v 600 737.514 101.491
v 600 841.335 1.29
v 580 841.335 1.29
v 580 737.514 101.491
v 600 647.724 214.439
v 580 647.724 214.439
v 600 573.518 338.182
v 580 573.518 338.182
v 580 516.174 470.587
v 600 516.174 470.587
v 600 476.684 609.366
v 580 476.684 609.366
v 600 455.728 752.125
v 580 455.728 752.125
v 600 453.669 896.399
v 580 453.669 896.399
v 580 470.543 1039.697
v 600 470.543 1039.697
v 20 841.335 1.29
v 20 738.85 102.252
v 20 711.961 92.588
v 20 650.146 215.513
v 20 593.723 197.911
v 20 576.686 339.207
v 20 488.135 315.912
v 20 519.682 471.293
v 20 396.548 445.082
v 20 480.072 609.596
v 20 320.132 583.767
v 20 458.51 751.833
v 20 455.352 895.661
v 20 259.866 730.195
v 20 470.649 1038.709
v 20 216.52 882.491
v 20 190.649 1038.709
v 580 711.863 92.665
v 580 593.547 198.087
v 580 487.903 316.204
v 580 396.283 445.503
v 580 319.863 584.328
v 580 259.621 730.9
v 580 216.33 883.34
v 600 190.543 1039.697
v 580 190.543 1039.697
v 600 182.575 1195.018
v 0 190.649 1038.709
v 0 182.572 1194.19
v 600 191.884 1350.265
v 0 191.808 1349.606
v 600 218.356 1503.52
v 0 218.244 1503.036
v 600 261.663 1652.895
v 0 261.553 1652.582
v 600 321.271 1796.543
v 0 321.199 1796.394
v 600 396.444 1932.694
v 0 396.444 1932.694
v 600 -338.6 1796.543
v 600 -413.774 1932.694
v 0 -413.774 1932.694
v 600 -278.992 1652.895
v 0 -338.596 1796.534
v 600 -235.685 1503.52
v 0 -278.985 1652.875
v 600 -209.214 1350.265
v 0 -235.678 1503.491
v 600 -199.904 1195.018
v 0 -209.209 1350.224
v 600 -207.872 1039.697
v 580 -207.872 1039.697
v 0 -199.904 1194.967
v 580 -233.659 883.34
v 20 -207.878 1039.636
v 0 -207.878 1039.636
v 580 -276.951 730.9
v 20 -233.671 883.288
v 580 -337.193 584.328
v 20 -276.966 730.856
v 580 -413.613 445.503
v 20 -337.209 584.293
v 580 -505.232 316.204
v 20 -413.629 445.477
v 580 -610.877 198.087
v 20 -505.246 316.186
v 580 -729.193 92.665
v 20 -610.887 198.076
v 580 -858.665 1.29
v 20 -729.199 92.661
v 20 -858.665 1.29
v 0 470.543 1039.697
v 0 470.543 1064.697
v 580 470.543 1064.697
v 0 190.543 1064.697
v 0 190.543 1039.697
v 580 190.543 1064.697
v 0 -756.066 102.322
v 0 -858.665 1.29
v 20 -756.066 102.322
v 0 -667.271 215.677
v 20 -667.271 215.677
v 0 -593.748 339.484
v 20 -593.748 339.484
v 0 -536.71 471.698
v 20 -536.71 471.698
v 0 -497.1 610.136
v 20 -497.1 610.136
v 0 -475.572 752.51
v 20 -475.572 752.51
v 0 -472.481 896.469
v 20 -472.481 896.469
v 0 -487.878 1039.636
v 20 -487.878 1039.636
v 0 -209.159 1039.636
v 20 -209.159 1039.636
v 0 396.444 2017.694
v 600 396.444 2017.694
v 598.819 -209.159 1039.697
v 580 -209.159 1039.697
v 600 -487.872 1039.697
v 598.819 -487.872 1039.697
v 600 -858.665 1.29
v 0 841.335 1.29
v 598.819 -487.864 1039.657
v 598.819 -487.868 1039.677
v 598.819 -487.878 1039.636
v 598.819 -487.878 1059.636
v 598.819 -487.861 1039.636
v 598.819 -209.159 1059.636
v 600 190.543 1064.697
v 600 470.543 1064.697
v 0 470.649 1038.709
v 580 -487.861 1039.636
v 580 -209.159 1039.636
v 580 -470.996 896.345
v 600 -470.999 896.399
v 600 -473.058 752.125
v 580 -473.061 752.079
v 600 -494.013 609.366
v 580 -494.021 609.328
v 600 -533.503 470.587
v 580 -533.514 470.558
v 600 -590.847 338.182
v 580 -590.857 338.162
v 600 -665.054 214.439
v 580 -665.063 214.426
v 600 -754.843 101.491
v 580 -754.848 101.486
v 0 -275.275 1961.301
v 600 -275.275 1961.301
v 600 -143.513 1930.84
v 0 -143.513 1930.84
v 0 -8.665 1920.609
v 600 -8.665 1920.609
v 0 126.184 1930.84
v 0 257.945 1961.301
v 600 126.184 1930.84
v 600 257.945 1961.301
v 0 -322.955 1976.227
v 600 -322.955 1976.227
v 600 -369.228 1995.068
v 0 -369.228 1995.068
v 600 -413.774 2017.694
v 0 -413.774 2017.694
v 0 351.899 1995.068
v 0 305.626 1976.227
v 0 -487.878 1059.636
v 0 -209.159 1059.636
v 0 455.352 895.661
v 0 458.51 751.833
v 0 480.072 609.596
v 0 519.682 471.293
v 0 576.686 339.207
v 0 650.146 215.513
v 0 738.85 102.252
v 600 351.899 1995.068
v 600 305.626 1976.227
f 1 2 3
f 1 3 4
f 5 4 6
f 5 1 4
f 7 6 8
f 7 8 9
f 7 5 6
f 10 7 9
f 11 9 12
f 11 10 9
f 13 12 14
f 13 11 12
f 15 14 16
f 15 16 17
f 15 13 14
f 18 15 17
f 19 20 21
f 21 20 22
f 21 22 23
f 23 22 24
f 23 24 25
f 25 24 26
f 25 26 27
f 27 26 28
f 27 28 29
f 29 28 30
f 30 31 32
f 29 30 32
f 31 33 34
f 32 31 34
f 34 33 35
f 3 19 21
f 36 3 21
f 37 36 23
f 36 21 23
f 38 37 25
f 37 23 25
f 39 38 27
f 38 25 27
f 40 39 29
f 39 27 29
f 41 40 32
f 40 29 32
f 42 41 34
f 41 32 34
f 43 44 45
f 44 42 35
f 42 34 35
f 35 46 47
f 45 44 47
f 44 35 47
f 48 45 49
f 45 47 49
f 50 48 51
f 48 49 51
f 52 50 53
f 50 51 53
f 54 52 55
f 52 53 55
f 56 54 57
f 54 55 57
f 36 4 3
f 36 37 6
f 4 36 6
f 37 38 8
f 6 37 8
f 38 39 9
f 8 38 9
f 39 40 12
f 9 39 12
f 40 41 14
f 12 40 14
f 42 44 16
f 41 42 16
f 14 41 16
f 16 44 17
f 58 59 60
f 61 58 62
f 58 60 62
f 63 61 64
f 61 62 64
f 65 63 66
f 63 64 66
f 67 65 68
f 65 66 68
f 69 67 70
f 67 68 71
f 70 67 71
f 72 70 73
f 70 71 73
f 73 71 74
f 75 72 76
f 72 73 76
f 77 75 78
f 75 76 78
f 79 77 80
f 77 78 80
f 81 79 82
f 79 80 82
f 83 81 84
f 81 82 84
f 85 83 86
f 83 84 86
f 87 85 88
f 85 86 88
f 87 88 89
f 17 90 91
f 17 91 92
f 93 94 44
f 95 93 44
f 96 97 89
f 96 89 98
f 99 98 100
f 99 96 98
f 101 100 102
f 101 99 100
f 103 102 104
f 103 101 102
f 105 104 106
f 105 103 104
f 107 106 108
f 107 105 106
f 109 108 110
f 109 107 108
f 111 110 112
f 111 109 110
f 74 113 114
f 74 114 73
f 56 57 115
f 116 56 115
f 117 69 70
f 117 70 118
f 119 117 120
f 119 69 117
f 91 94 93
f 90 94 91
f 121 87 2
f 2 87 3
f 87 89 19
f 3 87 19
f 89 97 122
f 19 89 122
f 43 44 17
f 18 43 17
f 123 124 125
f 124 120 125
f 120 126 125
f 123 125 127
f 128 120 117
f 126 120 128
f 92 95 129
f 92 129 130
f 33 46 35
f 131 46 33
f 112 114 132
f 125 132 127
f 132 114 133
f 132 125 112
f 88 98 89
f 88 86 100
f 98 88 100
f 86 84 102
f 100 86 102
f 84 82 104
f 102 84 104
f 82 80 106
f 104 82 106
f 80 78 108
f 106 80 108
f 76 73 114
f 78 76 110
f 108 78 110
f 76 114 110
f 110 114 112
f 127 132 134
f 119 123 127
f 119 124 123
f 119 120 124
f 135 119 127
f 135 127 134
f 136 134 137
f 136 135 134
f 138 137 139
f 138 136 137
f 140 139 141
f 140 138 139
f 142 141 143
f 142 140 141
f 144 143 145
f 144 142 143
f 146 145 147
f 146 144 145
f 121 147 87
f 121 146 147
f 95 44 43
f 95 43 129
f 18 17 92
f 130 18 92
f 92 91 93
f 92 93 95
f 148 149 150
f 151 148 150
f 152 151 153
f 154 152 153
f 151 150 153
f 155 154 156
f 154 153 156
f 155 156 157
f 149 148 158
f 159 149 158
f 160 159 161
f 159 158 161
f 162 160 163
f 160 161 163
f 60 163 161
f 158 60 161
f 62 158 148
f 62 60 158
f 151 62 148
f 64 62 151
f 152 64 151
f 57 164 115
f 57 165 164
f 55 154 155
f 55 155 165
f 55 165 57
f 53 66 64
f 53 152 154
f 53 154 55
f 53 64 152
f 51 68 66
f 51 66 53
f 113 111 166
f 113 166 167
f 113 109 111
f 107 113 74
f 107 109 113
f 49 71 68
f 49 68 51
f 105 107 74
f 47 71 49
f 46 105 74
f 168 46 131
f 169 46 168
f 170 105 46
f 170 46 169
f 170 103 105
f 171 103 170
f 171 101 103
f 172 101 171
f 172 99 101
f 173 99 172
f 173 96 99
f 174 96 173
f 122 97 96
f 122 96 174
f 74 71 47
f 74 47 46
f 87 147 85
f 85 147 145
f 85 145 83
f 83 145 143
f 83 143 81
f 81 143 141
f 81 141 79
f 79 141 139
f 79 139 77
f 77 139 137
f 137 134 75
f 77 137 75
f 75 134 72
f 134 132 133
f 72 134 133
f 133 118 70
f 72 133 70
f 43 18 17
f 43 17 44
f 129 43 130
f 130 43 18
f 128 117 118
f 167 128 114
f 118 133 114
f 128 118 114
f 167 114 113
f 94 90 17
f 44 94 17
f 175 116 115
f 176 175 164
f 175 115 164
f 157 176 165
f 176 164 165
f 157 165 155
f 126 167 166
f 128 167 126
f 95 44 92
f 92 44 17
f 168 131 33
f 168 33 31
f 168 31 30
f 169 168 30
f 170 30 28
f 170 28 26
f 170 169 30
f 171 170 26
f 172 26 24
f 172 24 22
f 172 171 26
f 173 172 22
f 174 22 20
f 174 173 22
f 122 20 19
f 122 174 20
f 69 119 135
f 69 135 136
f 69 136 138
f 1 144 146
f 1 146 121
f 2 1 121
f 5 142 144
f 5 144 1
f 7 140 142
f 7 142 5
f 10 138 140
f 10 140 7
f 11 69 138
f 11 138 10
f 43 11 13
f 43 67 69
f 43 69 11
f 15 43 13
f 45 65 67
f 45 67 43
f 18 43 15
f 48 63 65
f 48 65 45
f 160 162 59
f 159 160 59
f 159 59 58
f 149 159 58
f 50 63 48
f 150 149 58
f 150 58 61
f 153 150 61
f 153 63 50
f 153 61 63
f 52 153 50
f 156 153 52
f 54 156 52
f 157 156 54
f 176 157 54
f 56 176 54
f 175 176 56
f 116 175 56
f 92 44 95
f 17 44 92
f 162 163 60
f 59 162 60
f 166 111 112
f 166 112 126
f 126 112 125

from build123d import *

# Parameters (mm, degrees)
F1_DEPTH  = 600
F3_DEPTH  = 600.001
F5_DEPTH  = 20
F7_DEPTH  = 20
F8_W      = 580
F8_H      = 280
F9_DEPTH  = 25
F10_DEPTH = 20
F11_W     = 20
F11_H     = 278.7190201738
F11_W_2   = 578.8190174103
F12_DEPTH = 20


with BuildPart() as f1:
    # F0 (on Right) → F1 (new body)
    with BuildSketch(Plane.YZ):
        with BuildLine():
            ThreePointArc((-413.7737442203, 1932.6941884178), (-235.6171133469, 874.7152717166), (-858.6646769196, 1.2904570733))
            Line((-858.6646769196, 1.2904570733), (841.3353230804, 1.2904570733))
            ThreePointArc((841.3353230804, 1.2904570733), (218.2877610308, 874.7152723164), (396.4443930804, 1932.6941884178))
            Line((396.4443930804, 1932.6941884178), (396.4443930804, 2017.6941884178))
            ThreePointArc((396.4443930804, 2017.6941884178), (199.7456261802, 1948.7680536266), (-8.6646769196, 1951.2904570733))
            ThreePointArc((-8.6646769196, 1951.2904570733), (-217.0749786293, 1948.7680541113), (-413.7737442203, 2017.6941884178))
            Line((-413.7737442203, 2017.6941884178), (-413.7737442203, 1932.6941884178))
        make_face()
    extrude(amount=F1_DEPTH)

    # F2 (on face) → F3 (cut, through all)
    with BuildSketch(Plane.YZ.offset(600)):
        with BuildLine():
            Line((396.4443930804, 2017.6941884178), (-413.7737442203, 2017.6941884178))
            ThreePointArc((-413.7737442203, 2017.6941884178), (-345.7057427079, 1986.5957603046), (-275.2746839195, 1961.3008790249))
            ThreePointArc((-275.2746839195, 1961.3008790249), (-142.5331399832, 1941.2889121961), (-8.6646769196, 1951.2904570733))
            ThreePointArc((-8.6646769196, 1951.2904570733), (125.2037851776, 1941.2889117025), (257.9453283126, 1961.3008776288))
            ThreePointArc((257.9453283126, 1961.3008776288), (328.3763894007, 1986.5957594221), (396.4443930804, 2017.6941884178))
        make_face()
        with BuildLine():
            ThreePointArc((-8.6646769196, 1951.2904570733), (-142.5331399832, 1941.2889121961), (-275.2746839195, 1961.3008790249))
            ThreePointArc((-275.2746839195, 1961.3008790249), (-8.66467791, 1920.6086514411), (257.9453283126, 1961.3008776288))
            ThreePointArc((257.9453283126, 1961.3008776288), (125.2037851776, 1941.2889117025), (-8.6646769196, 1951.2904570733))
        make_face()
    extrude(amount=-F3_DEPTH, mode=Mode.SUBTRACT)

    # F4 (on face) → F5 (join)
    with BuildSketch(Plane.YZ.offset(600)):
        with BuildLine():
            ThreePointArc((-487.8719790556, 1039.6971702576), (-533.5033840935, 470.5867589871), (-858.6646769196, 1.2904570733))
            ThreePointArc((-858.6646769196, 1.2904570733), (-413.6127871917, 445.5030116798), (-207.8719790556, 1039.6971702576))
            Line((-207.8719790556, 1039.6971702576), (-487.8719790556, 1039.6971702576))
        make_face()
        with BuildLine():
            ThreePointArc((190.5426270267, 1039.6971702576), (396.283434362, 445.5030119538), (841.3353230804, 1.2904570733))
            ThreePointArc((841.3353230804, 1.2904570733), (516.1740306428, 470.5867590462), (470.5426270267, 1039.6971702576))
            Line((470.5426270267, 1039.6971702576), (190.5426270267, 1039.6971702576))
        make_face()
    extrude(amount=-F5_DEPTH)

    # F6 (on face) → F7 (join)
    with BuildSketch(Plane(origin=(0, 0, 0), x_dir=(0, -1, 0), z_dir=(-1, 0, 0))):
        with BuildLine():
            ThreePointArc((-841.3353230804, 1.2904570733), (-396.5475396439, 445.0817710452), (-190.6490020093, 1038.7085012816))
            Line((-190.6490020093, 1038.7085012816), (-470.6490020093, 1038.7085012816))
            ThreePointArc((-470.6490020093, 1038.7085012816), (-519.6815928842, 471.2934981386), (-841.3353230804, 1.2904570733))
        make_face()
        with BuildLine():
            ThreePointArc((207.878498719, 1039.6363848164), (413.6290200403, 445.4771111279), (858.6646769196, 1.2904570733))
            ThreePointArc((858.6646769196, 1.2904570733), (536.7100272294, 471.698228356), (487.878498719, 1039.6363848164))
            Line((487.878498719, 1039.6363848164), (207.878498719, 1039.6363848164))
        make_face()
    extrude(amount=-F7_DEPTH)

    # F11 (on face) → F12 (join)
    with BuildSketch(Plane.XY.offset(1039.6363848164)):
        with Locations((10, -348.5189886321)):
            Rectangle(F11_W, F11_H)
        with Locations((309.4095087051, -348.5189886321)):
            Rectangle(F11_W_2, F11_H)
    extrude(amount=F12_DEPTH)


with BuildPart() as f9:
    # F8 (on face) → F9 (new body)
    with BuildSketch(Plane.XY.offset(1039.6971702576)):
        with Locations((290, 330.5426270267)):
            Rectangle(F8_W, F8_H)
    extrude(amount=F9_DEPTH)


with BuildPart() as f10:
    # F10 (new): a face of the model
    f10_faces = [f9.part.faces().sort_by_distance(p)[0] for p in [
        (580, 330.5426270267, 1052.1971702576),
    ]]
    extrude(f10_faces, amount=F10_DEPTH)


solid = Compound([f1.part, f9.part, f10.part])
